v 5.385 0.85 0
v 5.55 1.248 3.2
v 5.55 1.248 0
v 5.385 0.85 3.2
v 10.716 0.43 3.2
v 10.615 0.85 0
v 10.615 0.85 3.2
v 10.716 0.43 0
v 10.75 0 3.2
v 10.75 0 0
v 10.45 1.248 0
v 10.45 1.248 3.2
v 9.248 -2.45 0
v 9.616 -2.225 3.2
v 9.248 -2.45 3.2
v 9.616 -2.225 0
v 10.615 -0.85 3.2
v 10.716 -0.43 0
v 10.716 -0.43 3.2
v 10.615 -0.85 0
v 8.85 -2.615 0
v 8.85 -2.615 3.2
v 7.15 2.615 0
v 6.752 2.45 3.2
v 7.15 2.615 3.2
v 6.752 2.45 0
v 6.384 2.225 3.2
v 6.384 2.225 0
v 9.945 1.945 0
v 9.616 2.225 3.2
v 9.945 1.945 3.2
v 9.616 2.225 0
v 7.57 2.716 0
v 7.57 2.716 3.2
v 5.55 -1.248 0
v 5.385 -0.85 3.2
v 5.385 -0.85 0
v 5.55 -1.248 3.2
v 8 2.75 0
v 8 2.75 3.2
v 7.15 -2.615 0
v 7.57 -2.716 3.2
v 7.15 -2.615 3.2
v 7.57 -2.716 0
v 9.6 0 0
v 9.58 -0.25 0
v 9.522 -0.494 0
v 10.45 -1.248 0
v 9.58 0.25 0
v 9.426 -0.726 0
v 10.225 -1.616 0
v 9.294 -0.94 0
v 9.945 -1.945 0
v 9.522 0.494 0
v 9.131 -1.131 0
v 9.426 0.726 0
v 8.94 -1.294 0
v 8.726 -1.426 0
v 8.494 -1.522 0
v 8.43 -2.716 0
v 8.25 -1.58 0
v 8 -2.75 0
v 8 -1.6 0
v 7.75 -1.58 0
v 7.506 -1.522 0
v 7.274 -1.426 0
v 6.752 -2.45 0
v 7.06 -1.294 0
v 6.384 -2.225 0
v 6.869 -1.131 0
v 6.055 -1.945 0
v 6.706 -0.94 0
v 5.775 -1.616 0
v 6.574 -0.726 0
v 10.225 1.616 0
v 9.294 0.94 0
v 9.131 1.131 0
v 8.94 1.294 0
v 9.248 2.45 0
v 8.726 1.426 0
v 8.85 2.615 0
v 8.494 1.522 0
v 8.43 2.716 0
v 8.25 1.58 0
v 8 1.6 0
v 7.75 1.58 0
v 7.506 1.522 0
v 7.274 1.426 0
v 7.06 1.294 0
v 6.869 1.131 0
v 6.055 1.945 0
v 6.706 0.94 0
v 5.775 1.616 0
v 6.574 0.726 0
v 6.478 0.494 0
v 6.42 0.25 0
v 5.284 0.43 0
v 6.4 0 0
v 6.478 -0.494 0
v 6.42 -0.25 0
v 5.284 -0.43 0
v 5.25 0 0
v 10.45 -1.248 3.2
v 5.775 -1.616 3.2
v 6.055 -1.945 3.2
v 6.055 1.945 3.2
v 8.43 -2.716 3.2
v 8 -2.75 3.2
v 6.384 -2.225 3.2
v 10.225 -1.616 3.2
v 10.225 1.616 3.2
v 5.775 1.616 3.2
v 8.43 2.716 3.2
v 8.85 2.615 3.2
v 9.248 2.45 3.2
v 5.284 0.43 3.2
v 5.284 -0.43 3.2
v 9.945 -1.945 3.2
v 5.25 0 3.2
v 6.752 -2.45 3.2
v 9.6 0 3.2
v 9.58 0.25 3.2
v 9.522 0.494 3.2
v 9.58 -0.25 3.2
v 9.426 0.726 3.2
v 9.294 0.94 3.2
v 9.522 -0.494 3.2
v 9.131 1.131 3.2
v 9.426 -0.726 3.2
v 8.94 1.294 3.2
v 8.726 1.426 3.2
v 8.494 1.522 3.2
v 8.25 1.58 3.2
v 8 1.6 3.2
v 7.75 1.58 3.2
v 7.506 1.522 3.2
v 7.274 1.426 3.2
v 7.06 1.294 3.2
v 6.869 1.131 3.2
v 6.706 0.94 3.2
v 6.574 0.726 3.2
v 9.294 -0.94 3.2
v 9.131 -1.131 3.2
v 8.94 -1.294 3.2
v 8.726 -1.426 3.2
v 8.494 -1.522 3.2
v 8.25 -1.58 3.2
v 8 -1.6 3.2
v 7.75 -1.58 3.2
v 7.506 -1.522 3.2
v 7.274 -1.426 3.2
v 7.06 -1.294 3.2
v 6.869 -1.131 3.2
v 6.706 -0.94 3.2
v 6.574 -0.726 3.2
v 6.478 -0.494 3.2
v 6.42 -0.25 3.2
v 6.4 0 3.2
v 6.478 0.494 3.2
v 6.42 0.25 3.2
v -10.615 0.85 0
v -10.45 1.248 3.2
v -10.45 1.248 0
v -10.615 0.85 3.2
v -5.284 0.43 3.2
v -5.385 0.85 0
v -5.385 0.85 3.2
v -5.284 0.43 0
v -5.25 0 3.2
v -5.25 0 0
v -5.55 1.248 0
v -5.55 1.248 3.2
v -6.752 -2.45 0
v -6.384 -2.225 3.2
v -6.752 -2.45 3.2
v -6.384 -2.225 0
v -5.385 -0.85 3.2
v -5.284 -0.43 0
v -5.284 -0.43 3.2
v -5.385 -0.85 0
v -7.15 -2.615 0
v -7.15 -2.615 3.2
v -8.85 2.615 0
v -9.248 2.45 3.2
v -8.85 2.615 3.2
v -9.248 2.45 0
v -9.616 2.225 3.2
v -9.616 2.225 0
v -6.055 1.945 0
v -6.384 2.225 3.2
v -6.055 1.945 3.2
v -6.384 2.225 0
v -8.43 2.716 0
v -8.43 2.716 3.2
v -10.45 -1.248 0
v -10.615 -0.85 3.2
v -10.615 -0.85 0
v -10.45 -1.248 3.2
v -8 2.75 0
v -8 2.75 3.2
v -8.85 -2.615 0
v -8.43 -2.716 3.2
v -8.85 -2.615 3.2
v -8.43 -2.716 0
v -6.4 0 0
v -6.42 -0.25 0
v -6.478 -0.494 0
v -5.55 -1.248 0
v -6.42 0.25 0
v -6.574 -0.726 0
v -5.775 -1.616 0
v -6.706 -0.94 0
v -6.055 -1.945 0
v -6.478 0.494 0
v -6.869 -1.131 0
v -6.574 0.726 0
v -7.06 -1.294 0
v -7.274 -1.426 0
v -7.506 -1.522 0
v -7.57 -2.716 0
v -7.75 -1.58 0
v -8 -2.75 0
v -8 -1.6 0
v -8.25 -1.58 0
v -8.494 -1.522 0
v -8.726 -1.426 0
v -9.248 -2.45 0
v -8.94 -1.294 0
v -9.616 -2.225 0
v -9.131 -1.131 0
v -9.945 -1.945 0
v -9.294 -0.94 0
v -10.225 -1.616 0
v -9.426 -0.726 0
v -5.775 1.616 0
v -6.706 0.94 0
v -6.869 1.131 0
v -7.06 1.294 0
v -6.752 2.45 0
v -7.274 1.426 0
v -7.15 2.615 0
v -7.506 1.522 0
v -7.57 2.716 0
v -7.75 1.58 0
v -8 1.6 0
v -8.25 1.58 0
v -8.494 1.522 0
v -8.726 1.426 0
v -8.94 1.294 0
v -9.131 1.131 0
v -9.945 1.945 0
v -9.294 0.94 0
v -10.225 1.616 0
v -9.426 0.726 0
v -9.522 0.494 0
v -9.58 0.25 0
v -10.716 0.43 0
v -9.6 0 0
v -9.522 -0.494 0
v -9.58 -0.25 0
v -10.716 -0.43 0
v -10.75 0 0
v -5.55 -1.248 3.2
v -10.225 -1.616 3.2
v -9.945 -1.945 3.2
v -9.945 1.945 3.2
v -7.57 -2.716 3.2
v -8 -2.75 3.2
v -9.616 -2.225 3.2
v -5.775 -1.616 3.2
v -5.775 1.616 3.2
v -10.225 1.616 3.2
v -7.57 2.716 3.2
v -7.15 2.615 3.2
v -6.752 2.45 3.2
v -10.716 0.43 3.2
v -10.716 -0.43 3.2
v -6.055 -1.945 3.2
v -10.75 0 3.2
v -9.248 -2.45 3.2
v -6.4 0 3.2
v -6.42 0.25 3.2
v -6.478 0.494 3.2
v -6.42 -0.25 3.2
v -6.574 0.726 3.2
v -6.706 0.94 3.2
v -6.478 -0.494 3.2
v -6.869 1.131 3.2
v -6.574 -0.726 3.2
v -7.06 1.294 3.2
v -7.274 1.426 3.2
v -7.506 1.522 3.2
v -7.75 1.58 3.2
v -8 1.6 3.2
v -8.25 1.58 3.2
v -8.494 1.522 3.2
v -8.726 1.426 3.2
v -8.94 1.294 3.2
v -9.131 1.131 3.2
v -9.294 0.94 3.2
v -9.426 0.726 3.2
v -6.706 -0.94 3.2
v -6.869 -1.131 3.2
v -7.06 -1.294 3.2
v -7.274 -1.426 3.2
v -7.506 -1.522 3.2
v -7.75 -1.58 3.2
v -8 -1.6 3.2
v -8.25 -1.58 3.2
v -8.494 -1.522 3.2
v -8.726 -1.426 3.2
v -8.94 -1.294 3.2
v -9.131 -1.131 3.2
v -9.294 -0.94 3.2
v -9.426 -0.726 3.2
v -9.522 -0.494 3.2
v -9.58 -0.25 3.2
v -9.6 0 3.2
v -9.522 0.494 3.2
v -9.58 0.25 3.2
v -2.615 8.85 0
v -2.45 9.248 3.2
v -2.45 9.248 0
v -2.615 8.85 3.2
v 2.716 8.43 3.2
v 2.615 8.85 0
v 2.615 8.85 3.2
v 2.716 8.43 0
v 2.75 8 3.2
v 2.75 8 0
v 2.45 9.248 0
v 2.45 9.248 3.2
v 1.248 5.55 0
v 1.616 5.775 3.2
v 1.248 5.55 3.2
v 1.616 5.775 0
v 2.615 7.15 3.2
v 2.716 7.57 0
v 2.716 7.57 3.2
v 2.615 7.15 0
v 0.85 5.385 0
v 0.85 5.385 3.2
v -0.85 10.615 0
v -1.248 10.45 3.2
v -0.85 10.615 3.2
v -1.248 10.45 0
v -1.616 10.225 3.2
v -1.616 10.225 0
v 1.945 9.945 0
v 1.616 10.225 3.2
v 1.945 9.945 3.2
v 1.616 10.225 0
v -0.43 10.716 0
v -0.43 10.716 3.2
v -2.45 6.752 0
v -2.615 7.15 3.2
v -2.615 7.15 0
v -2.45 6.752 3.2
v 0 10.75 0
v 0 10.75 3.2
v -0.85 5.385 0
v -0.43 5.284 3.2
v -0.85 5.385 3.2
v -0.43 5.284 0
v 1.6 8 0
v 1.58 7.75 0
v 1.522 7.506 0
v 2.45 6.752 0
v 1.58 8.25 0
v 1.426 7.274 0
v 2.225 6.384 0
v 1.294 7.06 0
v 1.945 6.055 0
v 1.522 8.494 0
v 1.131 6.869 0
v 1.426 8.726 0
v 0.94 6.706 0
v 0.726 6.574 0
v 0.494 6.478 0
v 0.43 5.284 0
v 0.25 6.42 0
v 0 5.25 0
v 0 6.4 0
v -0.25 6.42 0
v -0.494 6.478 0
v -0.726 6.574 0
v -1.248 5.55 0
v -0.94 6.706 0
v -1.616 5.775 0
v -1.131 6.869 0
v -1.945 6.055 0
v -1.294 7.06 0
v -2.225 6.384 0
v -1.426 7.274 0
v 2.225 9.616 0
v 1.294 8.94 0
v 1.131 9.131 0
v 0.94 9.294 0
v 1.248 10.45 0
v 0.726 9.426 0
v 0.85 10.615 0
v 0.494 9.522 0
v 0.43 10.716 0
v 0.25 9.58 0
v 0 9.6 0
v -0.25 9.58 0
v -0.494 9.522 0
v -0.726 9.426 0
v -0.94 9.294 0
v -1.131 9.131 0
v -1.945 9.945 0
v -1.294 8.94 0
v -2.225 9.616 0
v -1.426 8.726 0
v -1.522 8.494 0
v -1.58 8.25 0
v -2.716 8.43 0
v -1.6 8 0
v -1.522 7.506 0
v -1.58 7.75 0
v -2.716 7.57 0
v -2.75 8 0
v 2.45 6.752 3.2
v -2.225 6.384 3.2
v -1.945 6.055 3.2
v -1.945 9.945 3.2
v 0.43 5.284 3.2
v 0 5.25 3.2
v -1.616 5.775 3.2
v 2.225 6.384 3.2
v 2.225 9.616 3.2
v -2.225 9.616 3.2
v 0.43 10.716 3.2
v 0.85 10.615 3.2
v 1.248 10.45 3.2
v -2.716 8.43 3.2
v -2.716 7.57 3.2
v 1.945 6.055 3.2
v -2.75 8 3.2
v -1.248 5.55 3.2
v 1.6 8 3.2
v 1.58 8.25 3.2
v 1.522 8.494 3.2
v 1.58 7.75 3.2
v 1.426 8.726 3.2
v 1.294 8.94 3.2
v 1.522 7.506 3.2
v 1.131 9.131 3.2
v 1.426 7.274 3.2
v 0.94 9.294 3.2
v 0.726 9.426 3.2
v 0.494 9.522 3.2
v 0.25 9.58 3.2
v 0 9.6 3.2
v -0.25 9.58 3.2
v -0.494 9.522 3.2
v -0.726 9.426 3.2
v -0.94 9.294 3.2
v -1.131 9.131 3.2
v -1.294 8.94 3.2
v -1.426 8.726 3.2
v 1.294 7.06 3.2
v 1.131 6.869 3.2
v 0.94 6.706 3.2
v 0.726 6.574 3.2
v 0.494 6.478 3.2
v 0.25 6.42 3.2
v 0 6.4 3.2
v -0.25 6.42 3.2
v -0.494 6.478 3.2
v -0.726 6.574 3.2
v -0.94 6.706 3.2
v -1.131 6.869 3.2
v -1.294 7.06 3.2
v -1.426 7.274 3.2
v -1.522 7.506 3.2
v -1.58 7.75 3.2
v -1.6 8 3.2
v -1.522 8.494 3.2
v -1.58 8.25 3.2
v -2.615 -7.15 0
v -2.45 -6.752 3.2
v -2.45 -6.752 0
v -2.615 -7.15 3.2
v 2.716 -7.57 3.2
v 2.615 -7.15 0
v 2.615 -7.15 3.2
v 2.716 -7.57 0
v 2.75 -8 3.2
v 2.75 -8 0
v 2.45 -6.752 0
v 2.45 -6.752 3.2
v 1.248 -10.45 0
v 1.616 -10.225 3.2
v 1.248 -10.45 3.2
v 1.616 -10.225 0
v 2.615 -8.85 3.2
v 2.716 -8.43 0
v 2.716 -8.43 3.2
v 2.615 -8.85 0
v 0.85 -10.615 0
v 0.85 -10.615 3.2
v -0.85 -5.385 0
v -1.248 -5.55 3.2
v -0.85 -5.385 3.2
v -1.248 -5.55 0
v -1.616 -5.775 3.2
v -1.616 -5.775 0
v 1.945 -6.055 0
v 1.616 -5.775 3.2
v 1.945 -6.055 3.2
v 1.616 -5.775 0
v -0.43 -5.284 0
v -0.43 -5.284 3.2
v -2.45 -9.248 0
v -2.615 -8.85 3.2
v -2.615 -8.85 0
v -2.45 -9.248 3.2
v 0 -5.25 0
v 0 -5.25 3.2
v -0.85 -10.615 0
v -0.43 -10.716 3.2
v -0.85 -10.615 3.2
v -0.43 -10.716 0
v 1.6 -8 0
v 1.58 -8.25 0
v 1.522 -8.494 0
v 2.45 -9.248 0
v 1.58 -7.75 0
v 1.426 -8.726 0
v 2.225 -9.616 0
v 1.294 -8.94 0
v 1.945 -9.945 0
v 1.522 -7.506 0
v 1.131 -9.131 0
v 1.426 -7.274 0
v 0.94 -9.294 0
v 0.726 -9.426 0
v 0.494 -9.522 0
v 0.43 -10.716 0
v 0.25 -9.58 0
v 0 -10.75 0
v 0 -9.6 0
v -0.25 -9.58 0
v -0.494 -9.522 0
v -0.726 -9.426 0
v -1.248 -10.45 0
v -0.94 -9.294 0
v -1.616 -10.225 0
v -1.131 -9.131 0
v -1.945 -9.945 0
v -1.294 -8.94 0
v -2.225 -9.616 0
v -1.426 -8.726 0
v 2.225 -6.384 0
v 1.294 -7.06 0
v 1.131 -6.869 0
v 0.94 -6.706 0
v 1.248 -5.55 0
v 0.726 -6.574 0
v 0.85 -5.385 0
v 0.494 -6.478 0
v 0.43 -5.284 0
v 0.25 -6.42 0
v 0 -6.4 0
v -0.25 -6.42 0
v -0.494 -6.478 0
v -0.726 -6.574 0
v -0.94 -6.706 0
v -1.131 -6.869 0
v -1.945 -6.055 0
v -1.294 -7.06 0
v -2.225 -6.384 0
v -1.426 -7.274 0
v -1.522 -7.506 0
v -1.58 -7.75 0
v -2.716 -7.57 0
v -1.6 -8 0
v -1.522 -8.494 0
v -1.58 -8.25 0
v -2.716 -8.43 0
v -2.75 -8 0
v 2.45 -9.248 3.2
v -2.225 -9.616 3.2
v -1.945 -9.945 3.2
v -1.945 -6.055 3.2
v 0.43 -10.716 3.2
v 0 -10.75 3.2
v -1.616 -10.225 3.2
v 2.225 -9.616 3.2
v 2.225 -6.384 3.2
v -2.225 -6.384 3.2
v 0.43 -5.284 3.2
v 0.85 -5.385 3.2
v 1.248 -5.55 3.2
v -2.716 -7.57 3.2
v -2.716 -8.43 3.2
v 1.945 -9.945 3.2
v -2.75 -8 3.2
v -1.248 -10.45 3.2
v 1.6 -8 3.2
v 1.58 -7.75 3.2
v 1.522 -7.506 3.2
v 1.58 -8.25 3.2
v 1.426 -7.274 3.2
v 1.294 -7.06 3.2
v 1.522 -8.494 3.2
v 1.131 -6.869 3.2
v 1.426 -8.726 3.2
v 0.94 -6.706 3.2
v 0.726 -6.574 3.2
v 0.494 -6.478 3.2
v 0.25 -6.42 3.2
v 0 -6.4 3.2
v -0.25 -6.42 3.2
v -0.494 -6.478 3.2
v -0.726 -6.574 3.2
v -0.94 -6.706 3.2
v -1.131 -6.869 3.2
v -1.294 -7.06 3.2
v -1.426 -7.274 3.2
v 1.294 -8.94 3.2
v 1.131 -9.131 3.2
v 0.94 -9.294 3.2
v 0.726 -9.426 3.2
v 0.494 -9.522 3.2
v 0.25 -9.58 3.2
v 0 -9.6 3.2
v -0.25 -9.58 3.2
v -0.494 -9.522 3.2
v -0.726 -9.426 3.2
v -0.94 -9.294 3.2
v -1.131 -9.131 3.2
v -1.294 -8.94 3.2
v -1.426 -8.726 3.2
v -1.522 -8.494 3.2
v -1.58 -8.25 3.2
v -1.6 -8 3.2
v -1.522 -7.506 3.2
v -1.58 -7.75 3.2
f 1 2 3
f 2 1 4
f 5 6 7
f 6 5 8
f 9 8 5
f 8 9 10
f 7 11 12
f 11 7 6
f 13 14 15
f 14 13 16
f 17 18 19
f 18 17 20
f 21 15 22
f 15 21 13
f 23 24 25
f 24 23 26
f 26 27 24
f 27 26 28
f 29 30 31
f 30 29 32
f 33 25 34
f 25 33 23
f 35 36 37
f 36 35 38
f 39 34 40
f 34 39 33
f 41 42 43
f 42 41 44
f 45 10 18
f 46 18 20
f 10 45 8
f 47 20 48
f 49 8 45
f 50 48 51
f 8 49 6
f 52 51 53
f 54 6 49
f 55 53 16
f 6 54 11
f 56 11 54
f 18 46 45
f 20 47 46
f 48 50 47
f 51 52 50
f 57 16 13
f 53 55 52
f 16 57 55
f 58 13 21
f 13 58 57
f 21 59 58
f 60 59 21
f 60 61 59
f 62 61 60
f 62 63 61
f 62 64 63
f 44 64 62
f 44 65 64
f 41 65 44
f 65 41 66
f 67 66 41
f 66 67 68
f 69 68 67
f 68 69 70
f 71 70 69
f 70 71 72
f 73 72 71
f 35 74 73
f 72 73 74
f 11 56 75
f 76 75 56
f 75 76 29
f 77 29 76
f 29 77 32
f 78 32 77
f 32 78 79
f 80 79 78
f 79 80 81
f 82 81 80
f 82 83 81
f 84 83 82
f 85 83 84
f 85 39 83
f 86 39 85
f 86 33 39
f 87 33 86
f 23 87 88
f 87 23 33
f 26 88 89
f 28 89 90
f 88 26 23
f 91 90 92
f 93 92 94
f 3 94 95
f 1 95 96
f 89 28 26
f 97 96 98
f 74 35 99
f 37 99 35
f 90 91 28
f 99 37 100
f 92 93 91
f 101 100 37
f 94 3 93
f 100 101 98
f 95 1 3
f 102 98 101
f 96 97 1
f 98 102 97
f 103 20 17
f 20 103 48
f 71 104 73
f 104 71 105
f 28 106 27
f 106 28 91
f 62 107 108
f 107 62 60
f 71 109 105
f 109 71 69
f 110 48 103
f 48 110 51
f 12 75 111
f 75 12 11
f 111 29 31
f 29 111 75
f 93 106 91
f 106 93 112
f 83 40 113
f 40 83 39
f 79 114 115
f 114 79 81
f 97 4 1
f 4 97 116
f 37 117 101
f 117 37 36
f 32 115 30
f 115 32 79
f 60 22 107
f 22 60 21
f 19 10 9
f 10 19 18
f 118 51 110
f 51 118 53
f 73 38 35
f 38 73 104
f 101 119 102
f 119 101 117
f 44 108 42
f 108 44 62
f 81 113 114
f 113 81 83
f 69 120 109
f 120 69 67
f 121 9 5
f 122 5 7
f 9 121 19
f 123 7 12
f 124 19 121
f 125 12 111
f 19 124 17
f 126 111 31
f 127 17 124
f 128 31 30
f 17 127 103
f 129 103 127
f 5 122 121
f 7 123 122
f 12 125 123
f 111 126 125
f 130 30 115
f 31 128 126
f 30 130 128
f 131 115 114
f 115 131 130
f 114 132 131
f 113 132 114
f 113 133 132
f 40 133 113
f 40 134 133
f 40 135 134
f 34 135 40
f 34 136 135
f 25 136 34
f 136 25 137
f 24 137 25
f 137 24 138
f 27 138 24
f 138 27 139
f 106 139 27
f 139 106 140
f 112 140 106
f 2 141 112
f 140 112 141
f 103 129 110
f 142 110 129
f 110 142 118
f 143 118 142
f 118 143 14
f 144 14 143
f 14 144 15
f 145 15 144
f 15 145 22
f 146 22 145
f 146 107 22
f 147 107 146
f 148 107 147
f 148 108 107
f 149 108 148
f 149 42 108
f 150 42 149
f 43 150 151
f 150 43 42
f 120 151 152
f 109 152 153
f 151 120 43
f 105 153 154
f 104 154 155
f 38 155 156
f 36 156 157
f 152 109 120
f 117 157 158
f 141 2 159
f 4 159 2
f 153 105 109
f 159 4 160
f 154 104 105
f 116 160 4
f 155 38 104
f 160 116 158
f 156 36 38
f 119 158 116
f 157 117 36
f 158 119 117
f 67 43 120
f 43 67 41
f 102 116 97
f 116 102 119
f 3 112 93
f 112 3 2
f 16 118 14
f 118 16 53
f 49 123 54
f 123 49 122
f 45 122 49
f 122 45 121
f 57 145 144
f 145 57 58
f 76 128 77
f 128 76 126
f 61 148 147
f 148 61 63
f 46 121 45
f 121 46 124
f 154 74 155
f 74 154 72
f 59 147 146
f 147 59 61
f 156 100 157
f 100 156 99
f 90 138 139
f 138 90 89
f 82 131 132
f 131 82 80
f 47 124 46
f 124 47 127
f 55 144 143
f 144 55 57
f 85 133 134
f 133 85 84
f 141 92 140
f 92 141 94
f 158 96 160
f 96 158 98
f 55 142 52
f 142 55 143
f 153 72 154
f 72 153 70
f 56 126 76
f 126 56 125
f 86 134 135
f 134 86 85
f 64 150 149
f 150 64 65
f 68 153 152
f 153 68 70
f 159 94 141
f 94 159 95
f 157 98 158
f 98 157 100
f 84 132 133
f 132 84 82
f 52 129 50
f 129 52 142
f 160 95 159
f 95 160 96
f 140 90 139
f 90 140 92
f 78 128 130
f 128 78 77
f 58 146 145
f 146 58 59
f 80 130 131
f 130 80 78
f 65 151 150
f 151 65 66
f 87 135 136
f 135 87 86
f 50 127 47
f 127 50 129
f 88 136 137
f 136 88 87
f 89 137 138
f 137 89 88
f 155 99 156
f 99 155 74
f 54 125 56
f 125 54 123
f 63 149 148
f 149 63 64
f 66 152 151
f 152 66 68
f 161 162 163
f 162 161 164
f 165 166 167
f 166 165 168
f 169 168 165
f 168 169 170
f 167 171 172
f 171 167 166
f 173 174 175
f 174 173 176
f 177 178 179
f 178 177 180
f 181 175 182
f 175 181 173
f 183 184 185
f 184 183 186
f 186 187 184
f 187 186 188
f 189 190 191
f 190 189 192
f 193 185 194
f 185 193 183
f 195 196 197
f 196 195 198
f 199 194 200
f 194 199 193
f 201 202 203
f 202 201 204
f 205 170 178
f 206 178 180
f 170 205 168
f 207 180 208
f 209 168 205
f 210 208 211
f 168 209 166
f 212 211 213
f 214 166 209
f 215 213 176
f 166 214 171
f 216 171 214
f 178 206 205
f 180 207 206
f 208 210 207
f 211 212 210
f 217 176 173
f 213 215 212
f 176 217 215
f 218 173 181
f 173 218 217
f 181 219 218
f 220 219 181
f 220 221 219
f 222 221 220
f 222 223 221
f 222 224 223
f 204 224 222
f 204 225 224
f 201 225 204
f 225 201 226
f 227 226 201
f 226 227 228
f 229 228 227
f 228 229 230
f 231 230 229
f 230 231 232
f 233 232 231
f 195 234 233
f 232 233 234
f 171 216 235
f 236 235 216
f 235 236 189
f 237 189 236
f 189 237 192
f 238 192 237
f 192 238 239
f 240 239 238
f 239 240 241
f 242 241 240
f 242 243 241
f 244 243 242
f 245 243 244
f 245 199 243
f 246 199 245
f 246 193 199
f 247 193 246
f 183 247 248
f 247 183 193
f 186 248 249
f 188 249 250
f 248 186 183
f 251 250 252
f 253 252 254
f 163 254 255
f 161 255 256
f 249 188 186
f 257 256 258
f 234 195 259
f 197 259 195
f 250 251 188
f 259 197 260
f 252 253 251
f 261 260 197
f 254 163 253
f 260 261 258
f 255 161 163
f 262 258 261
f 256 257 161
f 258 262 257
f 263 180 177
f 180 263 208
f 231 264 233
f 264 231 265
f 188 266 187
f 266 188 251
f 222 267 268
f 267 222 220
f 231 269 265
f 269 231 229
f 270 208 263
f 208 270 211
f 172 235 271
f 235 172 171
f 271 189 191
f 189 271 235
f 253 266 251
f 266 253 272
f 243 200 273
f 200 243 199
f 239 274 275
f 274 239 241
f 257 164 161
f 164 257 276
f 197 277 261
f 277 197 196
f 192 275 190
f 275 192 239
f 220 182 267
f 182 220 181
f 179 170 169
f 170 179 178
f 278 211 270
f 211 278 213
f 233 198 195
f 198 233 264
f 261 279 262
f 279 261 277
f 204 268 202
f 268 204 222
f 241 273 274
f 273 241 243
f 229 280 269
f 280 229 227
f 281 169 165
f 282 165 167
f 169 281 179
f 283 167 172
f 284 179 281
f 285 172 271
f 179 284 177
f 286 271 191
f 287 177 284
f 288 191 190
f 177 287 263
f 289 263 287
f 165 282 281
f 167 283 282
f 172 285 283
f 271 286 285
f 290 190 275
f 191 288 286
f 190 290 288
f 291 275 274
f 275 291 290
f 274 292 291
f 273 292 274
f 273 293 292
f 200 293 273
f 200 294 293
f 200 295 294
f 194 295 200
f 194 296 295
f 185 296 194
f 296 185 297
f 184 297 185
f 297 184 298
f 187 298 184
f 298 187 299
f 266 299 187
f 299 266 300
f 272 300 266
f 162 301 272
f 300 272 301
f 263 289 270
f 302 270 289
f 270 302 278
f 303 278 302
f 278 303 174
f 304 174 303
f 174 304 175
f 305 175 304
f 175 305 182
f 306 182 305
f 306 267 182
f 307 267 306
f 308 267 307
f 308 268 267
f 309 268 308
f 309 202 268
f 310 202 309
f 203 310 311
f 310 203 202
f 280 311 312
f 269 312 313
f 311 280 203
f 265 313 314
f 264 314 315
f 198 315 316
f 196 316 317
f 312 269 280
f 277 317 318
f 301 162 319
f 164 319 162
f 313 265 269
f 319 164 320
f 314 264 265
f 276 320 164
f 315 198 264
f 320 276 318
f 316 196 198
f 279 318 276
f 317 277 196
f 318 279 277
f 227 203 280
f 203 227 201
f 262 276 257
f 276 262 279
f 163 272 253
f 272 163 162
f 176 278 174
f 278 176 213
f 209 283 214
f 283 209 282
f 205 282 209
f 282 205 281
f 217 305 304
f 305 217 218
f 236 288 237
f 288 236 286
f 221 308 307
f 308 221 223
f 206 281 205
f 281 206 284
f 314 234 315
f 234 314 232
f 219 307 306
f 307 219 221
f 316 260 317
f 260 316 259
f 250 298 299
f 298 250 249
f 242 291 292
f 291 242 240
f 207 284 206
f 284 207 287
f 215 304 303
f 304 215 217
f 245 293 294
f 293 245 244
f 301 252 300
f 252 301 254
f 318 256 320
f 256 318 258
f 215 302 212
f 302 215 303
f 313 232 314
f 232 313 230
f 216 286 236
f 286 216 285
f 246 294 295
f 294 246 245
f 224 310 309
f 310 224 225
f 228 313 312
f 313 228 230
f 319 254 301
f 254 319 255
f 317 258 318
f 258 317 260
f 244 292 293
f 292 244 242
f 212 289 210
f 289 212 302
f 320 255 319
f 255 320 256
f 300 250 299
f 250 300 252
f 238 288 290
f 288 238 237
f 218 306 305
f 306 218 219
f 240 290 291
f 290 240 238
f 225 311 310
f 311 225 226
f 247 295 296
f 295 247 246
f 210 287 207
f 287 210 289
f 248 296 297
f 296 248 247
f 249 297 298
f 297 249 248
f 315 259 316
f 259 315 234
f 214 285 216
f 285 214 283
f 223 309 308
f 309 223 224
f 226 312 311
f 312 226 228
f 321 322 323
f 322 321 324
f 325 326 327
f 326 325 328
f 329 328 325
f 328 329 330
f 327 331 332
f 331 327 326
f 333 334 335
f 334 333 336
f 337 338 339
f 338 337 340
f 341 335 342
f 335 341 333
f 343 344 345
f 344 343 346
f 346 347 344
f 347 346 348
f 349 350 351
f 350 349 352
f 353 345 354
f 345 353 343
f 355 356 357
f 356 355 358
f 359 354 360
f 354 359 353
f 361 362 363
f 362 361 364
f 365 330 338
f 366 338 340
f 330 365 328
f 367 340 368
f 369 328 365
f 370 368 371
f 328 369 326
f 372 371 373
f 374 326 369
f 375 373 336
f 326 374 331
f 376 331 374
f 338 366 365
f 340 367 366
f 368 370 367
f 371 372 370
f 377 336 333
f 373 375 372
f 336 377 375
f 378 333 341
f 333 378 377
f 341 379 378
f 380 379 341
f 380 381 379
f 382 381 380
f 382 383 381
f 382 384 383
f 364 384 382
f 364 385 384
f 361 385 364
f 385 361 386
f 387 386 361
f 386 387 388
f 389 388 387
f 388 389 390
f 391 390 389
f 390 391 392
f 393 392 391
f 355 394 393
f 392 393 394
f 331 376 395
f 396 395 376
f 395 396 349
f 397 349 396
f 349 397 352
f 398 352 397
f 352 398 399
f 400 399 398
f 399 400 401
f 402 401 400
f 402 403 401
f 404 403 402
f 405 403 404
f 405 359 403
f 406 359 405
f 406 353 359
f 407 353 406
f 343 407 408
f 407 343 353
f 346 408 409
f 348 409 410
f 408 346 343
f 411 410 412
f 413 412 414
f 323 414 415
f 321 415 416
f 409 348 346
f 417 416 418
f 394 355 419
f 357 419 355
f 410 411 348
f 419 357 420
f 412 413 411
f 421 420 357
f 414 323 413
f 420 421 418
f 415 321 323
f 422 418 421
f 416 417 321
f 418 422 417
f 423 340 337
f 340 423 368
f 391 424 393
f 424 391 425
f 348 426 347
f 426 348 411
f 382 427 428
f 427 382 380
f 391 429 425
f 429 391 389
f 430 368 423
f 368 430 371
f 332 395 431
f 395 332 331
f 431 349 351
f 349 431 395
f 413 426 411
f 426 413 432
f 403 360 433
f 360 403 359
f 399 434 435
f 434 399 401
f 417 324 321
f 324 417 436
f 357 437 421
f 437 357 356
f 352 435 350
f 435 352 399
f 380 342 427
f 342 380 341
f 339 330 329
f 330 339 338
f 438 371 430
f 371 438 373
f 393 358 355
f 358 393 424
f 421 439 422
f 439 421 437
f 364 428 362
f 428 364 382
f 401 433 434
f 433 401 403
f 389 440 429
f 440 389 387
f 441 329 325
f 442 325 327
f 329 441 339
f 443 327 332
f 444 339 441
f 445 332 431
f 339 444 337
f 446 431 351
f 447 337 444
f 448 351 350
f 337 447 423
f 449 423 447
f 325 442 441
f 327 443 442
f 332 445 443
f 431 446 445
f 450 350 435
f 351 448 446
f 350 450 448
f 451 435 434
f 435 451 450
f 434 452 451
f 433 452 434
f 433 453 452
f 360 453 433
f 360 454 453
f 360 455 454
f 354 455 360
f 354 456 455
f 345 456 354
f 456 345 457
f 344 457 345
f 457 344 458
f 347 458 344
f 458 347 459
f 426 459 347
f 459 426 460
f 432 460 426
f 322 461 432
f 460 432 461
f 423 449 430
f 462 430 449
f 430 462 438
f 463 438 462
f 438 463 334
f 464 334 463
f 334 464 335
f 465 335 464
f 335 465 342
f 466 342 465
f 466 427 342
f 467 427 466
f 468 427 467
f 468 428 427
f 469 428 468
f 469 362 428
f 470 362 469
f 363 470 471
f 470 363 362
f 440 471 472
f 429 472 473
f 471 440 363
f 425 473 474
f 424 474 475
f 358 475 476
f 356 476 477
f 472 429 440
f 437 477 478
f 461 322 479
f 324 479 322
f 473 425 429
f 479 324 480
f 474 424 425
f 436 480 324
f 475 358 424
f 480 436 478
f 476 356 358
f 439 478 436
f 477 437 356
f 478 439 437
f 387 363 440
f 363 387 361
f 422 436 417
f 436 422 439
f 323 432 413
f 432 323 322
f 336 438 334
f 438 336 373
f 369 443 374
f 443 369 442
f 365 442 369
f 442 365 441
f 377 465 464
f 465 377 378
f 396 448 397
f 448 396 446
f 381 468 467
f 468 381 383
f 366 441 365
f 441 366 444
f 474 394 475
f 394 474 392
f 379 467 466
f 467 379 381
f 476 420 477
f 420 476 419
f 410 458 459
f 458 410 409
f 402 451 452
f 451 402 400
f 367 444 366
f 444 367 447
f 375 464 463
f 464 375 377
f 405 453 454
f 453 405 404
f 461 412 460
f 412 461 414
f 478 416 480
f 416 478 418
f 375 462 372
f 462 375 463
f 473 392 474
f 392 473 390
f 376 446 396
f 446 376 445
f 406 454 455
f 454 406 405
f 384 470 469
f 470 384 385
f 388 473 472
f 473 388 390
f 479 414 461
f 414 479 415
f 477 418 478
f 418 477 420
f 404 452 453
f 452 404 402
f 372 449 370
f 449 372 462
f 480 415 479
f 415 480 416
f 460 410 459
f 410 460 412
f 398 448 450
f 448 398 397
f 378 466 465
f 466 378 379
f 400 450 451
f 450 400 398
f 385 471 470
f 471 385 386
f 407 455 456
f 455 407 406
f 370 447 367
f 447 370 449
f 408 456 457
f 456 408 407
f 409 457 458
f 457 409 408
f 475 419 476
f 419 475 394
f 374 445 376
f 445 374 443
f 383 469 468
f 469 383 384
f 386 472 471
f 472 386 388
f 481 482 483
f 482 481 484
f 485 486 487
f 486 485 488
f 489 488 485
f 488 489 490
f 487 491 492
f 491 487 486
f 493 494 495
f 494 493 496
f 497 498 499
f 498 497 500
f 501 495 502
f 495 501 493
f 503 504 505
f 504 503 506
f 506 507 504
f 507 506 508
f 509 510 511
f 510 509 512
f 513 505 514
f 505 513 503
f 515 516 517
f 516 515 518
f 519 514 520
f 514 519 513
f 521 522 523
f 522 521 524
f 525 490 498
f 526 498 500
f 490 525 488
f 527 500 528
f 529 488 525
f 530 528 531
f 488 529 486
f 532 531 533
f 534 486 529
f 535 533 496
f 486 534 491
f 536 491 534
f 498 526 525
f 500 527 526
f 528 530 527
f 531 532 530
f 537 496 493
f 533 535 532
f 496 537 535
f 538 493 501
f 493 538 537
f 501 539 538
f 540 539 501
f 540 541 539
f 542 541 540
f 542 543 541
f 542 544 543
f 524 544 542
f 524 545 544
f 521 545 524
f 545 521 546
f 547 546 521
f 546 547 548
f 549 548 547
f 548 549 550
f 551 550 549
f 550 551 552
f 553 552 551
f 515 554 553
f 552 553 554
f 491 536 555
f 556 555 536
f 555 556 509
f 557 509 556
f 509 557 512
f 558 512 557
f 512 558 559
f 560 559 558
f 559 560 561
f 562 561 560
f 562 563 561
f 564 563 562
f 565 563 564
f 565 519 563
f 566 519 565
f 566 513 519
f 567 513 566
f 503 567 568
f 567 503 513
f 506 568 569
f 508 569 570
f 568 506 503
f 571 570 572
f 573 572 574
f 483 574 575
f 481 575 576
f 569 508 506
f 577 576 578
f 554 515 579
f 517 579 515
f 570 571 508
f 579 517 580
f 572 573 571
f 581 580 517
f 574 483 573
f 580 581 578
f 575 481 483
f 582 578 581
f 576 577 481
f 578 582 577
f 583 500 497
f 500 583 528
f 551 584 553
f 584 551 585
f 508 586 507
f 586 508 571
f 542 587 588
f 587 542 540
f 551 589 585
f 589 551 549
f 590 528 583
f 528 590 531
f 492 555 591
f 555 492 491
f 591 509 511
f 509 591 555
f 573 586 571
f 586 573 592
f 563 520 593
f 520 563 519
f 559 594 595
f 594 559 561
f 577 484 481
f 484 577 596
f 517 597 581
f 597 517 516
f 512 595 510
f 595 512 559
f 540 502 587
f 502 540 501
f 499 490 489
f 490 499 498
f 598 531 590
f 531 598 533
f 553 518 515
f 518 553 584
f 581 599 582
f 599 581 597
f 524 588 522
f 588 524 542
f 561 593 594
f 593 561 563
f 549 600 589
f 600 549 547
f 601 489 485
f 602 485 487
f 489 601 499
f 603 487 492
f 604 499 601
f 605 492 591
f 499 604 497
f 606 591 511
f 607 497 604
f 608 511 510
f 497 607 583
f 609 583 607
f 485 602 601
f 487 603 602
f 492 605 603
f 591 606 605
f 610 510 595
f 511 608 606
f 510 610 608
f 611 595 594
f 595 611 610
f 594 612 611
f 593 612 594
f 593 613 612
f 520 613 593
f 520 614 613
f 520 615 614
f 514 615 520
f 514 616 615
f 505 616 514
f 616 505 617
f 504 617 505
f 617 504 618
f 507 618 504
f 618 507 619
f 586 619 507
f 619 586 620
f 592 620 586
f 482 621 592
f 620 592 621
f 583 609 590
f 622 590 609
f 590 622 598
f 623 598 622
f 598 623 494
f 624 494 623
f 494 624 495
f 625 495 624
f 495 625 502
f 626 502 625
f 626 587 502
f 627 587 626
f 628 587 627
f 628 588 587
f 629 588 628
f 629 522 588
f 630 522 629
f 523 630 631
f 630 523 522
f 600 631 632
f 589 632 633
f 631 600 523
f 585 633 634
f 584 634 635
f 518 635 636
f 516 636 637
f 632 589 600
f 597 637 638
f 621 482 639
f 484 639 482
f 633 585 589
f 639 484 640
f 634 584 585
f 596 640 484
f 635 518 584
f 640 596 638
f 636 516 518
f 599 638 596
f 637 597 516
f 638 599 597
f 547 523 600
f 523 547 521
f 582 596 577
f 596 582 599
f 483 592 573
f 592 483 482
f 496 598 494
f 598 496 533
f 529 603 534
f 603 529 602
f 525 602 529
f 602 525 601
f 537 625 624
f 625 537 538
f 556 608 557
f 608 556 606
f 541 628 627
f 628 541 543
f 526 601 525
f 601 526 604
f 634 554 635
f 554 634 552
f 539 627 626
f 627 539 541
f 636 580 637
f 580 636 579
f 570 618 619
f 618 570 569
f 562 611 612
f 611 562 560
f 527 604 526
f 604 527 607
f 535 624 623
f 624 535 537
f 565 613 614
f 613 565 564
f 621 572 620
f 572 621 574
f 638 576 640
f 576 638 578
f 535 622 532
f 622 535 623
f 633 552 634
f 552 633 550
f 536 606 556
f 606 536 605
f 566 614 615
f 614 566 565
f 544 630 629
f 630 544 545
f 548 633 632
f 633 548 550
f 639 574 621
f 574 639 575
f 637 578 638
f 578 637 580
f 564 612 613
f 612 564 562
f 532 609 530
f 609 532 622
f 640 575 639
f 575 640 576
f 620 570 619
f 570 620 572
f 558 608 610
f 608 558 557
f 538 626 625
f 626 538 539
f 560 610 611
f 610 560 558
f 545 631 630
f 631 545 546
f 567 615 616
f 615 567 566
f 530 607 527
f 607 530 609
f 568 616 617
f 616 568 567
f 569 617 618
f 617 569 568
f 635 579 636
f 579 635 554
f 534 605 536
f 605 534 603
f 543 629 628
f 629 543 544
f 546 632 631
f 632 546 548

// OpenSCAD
$fn=40;
e=0.01;

hole_dia=3.2;
outer=5.5;

module t(h=3.2) {
  difference() {
    cylinder(r=outer/2, h=h);
    translate([0, 0, -e]) cylinder(r=hole_dia/2, h=h+2*e);
  }
}

w=8;
translate([w, 0, 0]) t();
translate([-w, 0, 0]) t();
translate([0, w, 0]) t();
translate([0, -w, 0]) t();
